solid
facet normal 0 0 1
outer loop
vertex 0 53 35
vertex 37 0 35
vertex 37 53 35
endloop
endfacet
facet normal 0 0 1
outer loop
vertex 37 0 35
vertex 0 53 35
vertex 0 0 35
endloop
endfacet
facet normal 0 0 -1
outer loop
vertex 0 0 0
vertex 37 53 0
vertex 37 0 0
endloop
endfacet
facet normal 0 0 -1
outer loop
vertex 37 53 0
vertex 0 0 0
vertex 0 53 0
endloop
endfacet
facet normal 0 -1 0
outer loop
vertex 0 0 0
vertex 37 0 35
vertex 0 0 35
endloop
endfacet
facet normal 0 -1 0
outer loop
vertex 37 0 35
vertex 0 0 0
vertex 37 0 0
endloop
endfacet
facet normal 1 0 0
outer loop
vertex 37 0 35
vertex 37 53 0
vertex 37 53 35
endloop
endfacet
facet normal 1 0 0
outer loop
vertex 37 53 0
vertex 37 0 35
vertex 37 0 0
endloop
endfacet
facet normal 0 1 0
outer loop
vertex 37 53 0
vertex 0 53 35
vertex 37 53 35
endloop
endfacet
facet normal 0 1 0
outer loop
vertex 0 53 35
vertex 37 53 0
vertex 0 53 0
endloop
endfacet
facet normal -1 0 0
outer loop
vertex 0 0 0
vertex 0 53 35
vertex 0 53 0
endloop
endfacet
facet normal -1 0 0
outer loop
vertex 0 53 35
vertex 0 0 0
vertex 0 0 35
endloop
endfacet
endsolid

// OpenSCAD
// bakck
x=100;
y=x;
z=40;

// forks
x=75;
y=55;
z=35;

// knives
x=37;
y=53;

cube([x,y,z]);
